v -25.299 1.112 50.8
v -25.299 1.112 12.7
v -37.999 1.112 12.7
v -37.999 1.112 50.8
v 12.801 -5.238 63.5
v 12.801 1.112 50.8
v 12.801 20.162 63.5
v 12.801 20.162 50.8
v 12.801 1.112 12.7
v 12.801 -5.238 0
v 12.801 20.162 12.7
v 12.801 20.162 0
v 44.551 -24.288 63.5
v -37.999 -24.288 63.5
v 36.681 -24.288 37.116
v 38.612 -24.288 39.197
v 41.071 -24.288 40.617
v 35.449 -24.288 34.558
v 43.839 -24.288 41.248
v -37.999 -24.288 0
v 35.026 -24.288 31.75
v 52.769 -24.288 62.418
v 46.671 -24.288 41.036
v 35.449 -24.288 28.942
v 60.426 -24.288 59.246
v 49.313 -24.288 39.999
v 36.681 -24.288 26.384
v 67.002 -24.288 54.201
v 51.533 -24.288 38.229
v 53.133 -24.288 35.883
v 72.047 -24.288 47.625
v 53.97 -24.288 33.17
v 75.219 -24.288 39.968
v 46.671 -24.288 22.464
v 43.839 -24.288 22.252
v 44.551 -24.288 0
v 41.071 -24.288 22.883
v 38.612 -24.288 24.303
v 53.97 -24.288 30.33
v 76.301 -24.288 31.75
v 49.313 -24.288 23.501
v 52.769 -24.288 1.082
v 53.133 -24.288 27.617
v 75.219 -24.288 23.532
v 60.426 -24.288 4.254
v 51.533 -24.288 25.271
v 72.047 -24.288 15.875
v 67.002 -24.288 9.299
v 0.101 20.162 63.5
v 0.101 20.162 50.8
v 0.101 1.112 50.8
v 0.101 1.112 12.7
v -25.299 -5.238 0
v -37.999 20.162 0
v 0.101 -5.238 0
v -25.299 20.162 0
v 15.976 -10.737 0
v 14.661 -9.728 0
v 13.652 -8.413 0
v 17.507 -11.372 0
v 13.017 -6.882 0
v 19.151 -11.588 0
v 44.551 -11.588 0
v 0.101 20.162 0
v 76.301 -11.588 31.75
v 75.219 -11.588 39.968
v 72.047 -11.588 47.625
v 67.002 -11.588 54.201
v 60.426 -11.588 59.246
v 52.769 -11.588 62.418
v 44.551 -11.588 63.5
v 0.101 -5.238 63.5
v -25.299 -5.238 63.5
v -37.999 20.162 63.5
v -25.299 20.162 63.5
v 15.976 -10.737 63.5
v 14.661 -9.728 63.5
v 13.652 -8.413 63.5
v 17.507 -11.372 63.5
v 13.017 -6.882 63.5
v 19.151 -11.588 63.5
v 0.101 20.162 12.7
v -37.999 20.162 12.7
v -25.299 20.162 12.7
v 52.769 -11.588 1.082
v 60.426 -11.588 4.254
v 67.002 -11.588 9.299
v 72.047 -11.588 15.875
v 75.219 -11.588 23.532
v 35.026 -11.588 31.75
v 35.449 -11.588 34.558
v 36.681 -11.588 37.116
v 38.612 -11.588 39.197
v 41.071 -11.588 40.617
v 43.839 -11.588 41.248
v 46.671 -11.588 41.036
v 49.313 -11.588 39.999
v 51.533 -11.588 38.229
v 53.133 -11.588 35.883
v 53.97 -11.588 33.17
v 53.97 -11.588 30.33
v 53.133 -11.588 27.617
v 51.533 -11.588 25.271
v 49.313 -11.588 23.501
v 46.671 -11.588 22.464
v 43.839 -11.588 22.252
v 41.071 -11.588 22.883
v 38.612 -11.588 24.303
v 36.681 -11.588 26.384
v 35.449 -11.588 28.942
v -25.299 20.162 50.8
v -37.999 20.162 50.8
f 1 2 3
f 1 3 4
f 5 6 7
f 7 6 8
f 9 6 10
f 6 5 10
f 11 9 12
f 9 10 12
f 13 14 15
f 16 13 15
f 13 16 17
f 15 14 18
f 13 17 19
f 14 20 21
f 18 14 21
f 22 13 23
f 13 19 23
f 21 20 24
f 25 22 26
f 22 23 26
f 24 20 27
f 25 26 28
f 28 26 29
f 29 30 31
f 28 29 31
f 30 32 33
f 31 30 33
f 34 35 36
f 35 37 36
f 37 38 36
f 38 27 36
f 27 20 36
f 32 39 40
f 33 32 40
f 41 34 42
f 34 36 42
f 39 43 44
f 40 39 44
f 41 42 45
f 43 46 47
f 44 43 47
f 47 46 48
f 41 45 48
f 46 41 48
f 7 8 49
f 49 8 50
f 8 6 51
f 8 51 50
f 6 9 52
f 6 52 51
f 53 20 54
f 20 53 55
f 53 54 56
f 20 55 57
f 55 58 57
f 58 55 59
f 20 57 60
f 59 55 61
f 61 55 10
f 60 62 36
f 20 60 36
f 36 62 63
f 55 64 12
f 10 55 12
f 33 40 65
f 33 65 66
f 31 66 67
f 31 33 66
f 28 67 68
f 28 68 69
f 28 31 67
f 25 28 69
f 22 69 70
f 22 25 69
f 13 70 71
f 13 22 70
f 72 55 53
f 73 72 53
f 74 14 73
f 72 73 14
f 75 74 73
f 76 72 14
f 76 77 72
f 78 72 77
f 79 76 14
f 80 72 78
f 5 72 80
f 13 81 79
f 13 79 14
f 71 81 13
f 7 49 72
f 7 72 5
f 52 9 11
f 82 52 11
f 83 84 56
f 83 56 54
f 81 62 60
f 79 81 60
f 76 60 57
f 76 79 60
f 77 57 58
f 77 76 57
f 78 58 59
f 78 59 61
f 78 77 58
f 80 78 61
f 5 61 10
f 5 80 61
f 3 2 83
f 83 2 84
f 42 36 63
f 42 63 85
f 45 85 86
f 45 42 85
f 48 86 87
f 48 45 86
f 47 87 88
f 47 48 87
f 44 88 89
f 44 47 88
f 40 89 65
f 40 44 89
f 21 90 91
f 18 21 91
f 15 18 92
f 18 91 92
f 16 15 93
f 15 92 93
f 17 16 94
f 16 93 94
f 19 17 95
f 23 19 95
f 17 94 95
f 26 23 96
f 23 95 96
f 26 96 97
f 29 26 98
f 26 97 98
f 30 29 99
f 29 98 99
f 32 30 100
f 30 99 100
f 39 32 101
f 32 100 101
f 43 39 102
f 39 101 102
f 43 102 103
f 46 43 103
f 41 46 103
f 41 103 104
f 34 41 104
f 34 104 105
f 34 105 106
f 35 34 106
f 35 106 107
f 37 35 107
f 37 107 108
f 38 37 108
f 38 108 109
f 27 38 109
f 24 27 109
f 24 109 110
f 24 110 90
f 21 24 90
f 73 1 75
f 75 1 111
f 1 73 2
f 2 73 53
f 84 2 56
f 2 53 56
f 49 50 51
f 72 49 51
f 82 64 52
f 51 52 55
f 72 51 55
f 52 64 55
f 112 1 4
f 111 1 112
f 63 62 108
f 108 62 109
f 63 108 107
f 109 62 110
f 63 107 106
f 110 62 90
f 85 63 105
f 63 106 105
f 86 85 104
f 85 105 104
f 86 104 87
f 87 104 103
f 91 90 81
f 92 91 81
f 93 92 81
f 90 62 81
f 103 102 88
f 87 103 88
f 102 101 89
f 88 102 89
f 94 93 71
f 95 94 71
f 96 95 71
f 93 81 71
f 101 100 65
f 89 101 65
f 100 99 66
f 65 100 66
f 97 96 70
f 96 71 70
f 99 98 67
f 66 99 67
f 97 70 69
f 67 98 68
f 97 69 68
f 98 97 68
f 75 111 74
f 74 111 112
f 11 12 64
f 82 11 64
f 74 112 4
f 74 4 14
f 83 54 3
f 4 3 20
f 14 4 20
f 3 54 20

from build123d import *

# Parameters (mm, degrees)
F1_DEPTH = 63.5
F3_DEPTH = 12.7
F4_R     = 9.525
F5_DEPTH = 25.4
F6_W     = 19.05
F6_H     = 38.1
F7_DEPTH = 25.4
F8_W     = 19.05
F8_H     = 38.1
F9_DEPTH = 25.4
F10_R    = 6.35


with BuildPart() as f1:
    # F0 (on Top) → F1 (new body)
    with BuildSketch(Plane.XY):
        Polygon((-25.299002, 20.161893), (-37.999002, 20.161893), (-37.999002, -24.288107), (44.550998, -24.288107), (44.550998, -11.588107), (12.800998, -11.588107), (12.800998, 20.161893), (0.100998, 20.161893), (0.100998, -5.238107), (-25.299002, -5.238107), align=None)
    extrude(amount=F1_DEPTH)

    # F2 (on face) → F3 (join)
    with BuildSketch(Plane.XZ.offset(24.288107)):
        with BuildLine():
            Line((44.550998, 0), (44.550998, 63.5))
            ThreePointArc((44.550998, 63.5), (12.800998, 31.75), (44.550998, 0))
        make_face()
        with BuildLine():
            ThreePointArc((44.550998, 0), (67.001639, 9.29936), (76.300998, 31.75))
            ThreePointArc((76.300998, 31.75), (67.001639, 54.20064), (44.550998, 63.5))
            Line((44.550998, 63.5), (44.550998, 0))
        make_face()
    extrude(amount=-F3_DEPTH)

    # F4 (on face) → F5 (cut)
    with BuildSketch(Plane(origin=(0, -11.588107, 0), x_dir=(-1, 0, 0), z_dir=(0, 1, 0))):
        with Locations((-44.550998, 31.75)):
            Circle(F4_R)
    extrude(amount=-F5_DEPTH, mode=Mode.SUBTRACT)

    # F6 (on face) → F7 (cut)
    with BuildSketch(Plane.YZ.offset(12.800998)):
        with Locations((10.636893, 31.75)):
            Rectangle(F6_W, F6_H)
    extrude(amount=-F7_DEPTH, mode=Mode.SUBTRACT)

    # F8 (on face) → F9 (cut)
    with BuildSketch(Plane.YZ.offset(-25.299002)):
        with Locations((10.636893, 31.75)):
            Rectangle(F8_W, F8_H)
    extrude(amount=-F9_DEPTH, mode=Mode.SUBTRACT)

    # F10
    f10_edges = [f1.edges().sort_by_distance(p)[0] for p in [
        (12.800998, -11.588107, 31.75),
    ]]
    fillet(f10_edges, radius=F10_R)


solid = f1.part
